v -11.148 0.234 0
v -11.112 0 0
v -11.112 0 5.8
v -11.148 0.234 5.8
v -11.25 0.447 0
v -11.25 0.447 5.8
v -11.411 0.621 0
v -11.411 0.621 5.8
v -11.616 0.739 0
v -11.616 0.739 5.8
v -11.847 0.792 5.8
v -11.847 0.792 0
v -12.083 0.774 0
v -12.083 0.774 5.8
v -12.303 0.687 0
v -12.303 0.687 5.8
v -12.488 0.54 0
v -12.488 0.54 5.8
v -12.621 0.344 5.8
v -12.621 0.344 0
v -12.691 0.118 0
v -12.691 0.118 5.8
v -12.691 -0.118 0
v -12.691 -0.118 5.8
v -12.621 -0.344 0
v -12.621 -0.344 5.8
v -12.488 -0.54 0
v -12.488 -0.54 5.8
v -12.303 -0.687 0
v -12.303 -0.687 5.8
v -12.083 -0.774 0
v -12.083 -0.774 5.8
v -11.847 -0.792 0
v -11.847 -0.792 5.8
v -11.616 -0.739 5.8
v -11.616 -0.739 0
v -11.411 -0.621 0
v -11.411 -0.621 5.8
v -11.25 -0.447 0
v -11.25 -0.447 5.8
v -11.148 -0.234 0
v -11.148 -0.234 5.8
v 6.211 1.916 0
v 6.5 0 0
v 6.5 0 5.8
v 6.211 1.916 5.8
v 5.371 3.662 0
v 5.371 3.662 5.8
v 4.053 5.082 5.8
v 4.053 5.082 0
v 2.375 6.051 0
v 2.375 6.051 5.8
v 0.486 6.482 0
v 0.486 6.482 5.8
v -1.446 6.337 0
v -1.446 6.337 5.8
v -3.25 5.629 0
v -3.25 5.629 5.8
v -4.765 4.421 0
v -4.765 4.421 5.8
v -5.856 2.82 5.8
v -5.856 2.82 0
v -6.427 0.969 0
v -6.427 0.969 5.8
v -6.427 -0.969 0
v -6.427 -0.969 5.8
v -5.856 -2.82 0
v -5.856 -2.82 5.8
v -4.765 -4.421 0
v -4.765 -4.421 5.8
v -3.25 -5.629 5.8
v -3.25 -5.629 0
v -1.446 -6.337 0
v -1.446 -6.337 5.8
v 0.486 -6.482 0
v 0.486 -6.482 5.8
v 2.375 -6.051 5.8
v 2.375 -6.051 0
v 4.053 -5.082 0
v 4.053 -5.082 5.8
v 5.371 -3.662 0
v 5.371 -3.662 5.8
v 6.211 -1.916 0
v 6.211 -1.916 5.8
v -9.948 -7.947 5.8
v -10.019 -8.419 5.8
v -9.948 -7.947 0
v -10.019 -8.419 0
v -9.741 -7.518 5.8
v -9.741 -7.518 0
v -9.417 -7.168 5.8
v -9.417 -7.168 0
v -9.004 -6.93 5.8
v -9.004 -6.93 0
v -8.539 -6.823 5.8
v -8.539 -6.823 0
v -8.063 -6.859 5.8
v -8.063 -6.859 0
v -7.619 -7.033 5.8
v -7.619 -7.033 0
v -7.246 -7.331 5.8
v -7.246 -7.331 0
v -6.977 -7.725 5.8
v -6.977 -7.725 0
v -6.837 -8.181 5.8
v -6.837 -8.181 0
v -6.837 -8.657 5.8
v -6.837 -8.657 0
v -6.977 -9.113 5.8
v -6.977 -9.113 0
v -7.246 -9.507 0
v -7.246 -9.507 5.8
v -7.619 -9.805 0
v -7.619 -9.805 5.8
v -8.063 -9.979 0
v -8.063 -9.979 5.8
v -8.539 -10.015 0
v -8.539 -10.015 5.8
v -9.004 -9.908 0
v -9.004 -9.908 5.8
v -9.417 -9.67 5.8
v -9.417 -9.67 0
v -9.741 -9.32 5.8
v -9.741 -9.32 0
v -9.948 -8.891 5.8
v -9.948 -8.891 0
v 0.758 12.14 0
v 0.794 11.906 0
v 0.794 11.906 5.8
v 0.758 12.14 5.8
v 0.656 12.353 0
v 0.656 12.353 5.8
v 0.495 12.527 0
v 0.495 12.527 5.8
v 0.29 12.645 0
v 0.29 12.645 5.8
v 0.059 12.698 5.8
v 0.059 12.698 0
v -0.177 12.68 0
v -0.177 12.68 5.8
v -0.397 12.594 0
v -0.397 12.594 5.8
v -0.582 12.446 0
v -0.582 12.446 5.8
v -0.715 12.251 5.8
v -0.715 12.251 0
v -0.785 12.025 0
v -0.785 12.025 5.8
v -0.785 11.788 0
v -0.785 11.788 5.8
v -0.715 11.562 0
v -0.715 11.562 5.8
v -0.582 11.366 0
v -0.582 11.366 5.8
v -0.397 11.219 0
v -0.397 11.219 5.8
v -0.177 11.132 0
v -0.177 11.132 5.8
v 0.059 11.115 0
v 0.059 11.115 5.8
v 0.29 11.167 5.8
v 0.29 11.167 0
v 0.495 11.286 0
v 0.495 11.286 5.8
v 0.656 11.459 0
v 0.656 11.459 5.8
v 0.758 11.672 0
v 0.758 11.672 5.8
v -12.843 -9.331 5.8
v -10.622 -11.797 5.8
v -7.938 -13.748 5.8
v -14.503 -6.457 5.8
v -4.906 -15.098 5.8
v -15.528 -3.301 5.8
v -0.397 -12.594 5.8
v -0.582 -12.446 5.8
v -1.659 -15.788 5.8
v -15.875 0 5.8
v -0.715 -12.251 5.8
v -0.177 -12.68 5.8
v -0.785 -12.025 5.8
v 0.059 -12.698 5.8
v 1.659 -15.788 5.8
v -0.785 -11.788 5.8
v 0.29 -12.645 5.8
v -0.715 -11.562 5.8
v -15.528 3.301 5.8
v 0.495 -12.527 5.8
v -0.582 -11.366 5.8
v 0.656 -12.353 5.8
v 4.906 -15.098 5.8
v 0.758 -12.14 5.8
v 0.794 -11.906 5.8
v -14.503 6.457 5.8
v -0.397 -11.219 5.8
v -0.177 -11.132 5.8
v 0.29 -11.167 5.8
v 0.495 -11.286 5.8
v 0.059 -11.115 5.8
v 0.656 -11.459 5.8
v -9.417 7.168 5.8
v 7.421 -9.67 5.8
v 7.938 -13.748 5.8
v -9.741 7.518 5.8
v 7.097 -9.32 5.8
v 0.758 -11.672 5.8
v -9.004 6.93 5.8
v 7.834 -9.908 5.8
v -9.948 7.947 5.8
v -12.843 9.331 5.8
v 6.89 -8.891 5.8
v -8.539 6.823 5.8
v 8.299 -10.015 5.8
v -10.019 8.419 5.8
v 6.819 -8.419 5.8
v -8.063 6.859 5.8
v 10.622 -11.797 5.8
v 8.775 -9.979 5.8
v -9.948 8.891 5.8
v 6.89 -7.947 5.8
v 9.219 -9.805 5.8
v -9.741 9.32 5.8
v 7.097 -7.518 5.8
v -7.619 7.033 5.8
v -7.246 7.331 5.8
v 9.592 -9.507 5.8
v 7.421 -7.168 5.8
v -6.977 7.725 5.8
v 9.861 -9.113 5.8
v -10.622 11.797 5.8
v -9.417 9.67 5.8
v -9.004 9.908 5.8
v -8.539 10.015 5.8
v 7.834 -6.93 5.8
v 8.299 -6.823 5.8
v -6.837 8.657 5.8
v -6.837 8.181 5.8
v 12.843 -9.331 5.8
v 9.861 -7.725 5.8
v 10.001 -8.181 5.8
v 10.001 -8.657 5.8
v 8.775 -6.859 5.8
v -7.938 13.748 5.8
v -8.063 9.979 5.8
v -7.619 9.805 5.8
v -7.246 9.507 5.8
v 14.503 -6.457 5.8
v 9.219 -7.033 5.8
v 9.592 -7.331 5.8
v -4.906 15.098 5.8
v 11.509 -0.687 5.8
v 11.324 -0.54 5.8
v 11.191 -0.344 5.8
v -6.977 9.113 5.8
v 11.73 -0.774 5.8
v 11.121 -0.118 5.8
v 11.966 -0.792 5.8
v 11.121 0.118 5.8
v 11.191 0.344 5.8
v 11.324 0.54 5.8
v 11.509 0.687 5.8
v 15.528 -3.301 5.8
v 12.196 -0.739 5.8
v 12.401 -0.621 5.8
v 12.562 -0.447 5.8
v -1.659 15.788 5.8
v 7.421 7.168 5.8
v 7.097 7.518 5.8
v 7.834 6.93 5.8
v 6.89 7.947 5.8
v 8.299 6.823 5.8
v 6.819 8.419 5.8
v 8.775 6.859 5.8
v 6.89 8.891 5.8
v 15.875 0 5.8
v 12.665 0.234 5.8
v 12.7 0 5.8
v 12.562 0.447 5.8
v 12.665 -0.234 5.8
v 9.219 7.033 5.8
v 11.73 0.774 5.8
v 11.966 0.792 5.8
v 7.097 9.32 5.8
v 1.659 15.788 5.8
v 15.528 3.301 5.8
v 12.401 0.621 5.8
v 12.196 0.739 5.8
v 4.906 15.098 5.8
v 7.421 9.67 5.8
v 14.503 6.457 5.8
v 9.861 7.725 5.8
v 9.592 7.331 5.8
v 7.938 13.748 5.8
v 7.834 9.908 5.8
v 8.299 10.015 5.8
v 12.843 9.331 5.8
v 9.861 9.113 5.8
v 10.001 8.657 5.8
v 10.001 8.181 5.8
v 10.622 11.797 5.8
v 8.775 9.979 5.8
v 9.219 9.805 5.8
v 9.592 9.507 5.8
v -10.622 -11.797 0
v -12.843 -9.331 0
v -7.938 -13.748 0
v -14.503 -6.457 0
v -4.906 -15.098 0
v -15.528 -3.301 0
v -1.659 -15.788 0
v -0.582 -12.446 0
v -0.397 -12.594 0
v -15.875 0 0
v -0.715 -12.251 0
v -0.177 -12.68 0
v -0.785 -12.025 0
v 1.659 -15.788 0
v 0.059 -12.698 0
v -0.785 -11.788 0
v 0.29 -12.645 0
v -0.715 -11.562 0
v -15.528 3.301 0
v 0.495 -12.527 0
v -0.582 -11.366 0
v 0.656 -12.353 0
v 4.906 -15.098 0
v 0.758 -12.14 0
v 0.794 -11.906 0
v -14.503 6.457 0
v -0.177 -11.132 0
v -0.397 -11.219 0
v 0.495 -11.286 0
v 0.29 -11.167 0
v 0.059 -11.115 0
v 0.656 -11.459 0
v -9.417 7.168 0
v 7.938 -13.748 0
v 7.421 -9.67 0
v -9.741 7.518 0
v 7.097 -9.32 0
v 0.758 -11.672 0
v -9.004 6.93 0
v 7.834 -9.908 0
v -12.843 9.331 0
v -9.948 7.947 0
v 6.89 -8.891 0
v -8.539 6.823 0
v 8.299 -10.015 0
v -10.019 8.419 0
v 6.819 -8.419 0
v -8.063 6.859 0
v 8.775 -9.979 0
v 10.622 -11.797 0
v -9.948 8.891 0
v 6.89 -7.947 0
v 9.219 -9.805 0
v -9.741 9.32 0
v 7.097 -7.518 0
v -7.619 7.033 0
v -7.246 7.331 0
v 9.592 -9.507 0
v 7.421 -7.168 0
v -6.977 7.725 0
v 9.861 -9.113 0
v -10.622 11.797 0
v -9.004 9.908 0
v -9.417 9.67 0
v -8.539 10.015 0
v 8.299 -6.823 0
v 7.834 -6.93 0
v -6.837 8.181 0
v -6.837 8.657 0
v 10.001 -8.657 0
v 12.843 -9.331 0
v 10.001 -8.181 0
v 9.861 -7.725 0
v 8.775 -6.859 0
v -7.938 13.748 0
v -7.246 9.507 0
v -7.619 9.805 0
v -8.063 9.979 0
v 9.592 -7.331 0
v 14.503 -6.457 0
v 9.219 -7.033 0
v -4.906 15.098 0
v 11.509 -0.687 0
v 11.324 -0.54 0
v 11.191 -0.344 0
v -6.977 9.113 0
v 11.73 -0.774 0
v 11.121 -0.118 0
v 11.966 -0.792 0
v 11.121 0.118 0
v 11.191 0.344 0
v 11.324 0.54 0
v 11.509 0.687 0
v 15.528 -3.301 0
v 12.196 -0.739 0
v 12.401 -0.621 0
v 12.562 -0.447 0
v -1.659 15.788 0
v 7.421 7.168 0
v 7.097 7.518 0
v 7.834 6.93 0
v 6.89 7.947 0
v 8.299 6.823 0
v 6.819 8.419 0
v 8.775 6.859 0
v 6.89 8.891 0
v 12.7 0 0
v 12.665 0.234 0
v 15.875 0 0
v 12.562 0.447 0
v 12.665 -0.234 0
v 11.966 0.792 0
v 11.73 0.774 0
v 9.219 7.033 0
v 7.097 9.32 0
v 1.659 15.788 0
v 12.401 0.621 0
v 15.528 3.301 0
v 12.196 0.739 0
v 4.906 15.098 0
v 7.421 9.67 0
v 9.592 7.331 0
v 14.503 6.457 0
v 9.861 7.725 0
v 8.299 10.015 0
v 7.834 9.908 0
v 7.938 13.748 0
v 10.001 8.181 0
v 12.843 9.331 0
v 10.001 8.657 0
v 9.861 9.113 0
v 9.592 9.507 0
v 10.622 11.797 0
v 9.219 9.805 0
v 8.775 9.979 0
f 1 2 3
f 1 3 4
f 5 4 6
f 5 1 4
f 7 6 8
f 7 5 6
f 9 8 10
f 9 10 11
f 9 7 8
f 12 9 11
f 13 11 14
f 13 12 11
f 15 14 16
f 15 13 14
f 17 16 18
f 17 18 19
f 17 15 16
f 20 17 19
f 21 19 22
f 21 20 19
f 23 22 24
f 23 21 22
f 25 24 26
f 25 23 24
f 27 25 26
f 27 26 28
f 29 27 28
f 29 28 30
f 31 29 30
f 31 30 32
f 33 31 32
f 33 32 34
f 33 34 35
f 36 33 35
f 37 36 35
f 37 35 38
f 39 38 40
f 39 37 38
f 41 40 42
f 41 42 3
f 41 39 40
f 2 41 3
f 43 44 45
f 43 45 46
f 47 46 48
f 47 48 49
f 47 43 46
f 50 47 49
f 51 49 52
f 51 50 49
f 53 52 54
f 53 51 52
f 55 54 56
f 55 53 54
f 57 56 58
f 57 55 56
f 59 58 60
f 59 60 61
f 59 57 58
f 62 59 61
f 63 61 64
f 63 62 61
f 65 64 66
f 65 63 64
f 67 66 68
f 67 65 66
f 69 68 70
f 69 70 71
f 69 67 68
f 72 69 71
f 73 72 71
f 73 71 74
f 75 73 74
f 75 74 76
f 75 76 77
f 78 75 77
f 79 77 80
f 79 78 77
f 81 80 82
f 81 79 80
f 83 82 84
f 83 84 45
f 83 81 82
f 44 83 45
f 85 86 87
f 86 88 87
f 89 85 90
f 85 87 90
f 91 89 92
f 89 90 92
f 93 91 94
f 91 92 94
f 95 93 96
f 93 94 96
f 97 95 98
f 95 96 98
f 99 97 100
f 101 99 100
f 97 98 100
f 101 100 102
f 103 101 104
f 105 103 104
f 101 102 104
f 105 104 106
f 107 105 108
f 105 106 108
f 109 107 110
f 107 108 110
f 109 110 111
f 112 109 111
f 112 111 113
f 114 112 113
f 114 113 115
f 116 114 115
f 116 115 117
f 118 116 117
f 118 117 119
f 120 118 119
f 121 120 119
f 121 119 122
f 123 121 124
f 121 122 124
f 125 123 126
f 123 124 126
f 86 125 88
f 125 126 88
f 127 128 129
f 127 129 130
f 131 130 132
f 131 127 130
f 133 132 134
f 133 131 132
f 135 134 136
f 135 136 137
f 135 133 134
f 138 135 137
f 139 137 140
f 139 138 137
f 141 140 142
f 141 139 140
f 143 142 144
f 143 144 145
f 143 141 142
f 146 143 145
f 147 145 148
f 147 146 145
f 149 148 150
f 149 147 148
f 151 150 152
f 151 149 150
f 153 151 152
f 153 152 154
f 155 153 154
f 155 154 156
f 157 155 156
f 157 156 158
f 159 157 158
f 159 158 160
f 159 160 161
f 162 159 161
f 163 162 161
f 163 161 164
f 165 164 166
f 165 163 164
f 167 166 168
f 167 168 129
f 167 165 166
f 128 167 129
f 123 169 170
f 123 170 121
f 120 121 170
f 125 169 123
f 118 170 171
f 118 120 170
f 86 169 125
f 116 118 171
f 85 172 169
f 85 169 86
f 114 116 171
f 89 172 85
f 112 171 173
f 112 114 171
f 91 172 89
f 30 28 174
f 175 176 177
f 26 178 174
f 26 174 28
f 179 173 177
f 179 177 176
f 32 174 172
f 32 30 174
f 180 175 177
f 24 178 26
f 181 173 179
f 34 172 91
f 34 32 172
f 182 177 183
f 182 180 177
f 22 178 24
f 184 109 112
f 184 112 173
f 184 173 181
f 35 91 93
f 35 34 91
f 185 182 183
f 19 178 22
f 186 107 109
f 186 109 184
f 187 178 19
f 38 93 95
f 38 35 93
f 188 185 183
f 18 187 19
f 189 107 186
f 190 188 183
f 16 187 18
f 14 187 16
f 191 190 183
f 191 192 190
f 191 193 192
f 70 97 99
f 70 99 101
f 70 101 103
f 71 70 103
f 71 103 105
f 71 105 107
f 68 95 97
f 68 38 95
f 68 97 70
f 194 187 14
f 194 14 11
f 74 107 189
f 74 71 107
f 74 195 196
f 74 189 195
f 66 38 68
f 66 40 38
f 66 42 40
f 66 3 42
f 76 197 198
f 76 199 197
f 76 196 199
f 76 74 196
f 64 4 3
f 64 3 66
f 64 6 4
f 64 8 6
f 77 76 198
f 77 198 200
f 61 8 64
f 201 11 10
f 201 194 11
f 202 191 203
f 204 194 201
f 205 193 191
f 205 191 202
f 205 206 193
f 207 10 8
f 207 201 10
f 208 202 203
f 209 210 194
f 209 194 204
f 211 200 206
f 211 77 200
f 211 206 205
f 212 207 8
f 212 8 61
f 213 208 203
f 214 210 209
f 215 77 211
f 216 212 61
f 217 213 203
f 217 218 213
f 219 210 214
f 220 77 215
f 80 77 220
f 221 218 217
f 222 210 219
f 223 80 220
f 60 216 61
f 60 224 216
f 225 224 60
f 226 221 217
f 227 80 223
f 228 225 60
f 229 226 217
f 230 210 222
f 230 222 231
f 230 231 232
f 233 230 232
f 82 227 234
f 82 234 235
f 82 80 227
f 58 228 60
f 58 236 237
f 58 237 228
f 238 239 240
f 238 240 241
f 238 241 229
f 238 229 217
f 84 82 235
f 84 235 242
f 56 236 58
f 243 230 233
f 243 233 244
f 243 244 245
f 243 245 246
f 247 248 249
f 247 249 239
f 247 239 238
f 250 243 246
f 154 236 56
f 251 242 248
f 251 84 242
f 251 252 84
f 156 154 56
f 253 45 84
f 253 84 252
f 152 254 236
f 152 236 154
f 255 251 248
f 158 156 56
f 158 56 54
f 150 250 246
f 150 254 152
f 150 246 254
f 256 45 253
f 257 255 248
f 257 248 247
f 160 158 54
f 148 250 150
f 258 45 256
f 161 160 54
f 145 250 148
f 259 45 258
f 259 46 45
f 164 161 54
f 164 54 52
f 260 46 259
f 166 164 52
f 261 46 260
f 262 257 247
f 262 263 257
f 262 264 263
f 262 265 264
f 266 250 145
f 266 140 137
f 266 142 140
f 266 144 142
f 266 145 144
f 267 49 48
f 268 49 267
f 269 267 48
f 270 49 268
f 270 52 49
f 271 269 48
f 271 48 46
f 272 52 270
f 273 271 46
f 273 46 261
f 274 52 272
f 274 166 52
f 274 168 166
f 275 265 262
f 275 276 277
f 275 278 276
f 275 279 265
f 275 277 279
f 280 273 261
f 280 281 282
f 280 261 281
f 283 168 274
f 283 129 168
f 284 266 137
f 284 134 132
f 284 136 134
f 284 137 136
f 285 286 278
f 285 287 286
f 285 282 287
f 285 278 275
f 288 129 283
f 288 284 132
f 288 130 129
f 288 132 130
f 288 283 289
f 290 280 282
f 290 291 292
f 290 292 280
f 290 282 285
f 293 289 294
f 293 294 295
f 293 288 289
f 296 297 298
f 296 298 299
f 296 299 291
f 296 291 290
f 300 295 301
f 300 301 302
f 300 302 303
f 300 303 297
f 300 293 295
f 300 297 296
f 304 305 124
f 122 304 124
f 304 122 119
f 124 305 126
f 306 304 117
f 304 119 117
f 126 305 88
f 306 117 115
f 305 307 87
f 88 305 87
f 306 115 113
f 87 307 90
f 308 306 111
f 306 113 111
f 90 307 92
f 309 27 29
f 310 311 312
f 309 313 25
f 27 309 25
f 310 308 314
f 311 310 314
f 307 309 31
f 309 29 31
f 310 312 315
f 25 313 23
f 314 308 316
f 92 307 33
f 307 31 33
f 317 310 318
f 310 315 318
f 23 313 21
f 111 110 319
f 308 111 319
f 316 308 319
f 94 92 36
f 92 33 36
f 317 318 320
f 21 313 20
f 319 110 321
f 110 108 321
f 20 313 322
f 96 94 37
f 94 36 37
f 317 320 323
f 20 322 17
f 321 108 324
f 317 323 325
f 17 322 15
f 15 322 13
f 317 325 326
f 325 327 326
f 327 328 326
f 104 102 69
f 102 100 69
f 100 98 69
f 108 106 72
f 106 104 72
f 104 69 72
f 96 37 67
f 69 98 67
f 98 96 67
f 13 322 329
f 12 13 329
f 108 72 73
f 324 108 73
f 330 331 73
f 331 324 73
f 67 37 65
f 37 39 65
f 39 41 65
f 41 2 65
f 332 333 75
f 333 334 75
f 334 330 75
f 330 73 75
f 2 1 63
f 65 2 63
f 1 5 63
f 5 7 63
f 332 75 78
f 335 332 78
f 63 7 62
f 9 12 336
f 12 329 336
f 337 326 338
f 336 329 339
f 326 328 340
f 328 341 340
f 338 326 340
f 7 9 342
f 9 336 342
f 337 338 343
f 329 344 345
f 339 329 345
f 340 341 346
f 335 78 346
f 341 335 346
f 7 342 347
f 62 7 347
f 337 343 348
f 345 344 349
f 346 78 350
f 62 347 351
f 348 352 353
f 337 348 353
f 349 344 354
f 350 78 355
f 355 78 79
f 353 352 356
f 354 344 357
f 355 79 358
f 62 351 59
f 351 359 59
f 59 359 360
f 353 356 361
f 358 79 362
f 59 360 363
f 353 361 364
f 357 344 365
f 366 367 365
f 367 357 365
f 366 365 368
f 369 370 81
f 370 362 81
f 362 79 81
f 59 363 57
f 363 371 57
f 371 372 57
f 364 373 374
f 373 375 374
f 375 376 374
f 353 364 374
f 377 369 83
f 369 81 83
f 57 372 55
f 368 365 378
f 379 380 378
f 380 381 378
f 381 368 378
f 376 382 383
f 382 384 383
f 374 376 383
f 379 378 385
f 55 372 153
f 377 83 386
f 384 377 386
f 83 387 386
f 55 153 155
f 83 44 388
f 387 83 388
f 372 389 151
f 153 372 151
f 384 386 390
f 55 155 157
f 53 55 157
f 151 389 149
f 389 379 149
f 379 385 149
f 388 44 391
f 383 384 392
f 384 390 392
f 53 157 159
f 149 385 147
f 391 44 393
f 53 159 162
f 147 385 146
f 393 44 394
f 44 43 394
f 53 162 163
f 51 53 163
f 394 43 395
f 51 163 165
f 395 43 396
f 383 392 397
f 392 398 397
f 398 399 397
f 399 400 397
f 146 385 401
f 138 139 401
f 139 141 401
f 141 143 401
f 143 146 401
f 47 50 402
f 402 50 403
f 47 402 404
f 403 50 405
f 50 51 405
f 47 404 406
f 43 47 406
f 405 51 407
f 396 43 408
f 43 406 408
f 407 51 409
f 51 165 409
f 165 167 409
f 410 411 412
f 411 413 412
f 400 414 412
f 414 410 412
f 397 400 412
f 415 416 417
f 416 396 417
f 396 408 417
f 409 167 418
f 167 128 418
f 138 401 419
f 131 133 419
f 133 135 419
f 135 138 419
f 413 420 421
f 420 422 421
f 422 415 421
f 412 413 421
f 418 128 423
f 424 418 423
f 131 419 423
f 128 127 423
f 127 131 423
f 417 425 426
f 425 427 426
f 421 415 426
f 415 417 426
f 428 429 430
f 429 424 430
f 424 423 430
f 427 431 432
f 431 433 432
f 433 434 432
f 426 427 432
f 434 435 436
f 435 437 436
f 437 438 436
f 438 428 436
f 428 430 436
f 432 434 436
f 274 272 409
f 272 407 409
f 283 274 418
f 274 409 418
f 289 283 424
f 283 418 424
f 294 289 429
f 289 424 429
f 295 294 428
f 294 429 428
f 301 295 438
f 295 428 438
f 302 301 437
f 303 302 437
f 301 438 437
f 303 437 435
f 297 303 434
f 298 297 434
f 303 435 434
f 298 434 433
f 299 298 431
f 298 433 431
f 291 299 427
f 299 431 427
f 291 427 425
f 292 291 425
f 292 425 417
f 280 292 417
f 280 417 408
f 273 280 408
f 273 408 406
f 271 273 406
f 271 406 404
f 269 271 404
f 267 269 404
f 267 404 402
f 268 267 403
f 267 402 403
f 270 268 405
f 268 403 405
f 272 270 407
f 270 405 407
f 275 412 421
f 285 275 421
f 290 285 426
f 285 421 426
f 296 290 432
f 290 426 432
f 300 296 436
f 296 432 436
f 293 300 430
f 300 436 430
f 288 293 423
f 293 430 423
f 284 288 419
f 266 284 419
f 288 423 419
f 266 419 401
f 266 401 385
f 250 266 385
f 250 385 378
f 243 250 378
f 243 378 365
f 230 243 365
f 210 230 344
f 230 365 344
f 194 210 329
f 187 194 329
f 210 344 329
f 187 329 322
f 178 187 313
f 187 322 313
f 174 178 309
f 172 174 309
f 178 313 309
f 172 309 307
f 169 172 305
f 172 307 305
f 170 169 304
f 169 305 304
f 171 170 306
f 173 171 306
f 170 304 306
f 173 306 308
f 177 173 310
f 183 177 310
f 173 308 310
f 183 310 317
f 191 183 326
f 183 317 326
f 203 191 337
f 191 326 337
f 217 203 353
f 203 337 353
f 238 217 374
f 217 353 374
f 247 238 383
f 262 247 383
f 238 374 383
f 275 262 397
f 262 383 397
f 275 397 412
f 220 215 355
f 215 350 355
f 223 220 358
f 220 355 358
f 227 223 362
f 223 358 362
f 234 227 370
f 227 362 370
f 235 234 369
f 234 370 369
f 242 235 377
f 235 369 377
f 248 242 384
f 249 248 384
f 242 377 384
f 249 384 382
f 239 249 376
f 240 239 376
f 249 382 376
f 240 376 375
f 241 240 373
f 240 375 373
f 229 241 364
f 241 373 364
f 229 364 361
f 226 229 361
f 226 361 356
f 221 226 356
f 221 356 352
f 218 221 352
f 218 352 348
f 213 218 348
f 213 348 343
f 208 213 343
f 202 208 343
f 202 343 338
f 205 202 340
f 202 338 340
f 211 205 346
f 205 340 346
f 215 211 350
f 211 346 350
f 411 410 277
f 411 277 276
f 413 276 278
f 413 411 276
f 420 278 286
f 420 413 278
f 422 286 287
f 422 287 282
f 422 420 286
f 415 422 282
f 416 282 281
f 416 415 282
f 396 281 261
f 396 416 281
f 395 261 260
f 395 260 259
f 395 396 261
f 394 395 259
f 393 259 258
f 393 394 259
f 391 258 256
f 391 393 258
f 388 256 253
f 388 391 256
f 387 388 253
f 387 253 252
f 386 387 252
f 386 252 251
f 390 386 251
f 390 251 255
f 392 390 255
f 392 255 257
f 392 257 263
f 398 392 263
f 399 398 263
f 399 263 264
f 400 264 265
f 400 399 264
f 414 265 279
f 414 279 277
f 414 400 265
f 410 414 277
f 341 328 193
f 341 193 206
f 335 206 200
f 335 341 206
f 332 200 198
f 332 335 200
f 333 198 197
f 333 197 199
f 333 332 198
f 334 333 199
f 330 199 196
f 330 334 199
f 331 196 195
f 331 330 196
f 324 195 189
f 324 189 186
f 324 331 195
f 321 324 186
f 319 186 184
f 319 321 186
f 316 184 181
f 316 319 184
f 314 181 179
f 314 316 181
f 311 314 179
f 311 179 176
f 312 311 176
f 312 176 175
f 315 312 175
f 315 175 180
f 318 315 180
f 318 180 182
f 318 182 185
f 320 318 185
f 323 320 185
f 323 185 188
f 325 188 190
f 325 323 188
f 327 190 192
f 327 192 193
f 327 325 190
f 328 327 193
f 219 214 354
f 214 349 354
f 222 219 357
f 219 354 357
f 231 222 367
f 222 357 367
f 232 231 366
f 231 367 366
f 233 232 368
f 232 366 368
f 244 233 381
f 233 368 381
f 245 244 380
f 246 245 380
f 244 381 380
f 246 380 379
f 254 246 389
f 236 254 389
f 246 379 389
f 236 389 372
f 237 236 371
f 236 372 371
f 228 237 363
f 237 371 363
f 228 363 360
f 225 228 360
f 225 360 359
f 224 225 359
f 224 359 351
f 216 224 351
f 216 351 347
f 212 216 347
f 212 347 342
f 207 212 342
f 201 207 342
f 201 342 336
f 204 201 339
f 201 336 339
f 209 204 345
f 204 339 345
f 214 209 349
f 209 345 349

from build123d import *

# Parameters (mm, degrees)
SKETCH1_R                = 15.875
SKETCH1_R_2              = 6.5
SKETCH1_R_3              = 0.79375
BOSS_EXTRUDE1_DEPTH      = 5.8
M3_CLEARANCE_HOLE1_D     = 3.2
M3_CLEARANCE_HOLE1_DEPTH = 5.8
M3_CLEARANCE_HOLE1_TIP   = 0.96137699


with BuildPart() as part:
    # Sketch1 → Boss-Extrude1 (new body)
    with BuildSketch(Plane.XY):
        Circle(SKETCH1_R)
        Circle(SKETCH1_R_2, mode=Mode.SUBTRACT)
        with Locations((0, 11.90625)):
            Circle(SKETCH1_R_3, mode=Mode.SUBTRACT)
        with Locations((-11.90625, 0)):
            Circle(SKETCH1_R_3, mode=Mode.SUBTRACT)
        with Locations((0, -11.90625)):
            Circle(SKETCH1_R_3, mode=Mode.SUBTRACT)
        with Locations((11.90625, 0)):
            Circle(SKETCH1_R_3, mode=Mode.SUBTRACT)
    extrude(amount=BOSS_EXTRUDE1_DEPTH)

    # M3 Clearance Hole1
    with Locations(Plane.XY.offset(5.8)):
        with Locations((-8.418990114, 8.418990114), (8.418990114, 8.418990114), (8.418990114, -8.418990114), (-8.418990114, -8.418990114)):
            Hole(M3_CLEARANCE_HOLE1_D / 2, depth=M3_CLEARANCE_HOLE1_DEPTH)
            with Locations((0, 0, -(M3_CLEARANCE_HOLE1_DEPTH + M3_CLEARANCE_HOLE1_TIP / 2))):  # 118° drill point
                Cone(0, M3_CLEARANCE_HOLE1_D / 2, M3_CLEARANCE_HOLE1_TIP, mode=Mode.SUBTRACT)


solid = part.part
